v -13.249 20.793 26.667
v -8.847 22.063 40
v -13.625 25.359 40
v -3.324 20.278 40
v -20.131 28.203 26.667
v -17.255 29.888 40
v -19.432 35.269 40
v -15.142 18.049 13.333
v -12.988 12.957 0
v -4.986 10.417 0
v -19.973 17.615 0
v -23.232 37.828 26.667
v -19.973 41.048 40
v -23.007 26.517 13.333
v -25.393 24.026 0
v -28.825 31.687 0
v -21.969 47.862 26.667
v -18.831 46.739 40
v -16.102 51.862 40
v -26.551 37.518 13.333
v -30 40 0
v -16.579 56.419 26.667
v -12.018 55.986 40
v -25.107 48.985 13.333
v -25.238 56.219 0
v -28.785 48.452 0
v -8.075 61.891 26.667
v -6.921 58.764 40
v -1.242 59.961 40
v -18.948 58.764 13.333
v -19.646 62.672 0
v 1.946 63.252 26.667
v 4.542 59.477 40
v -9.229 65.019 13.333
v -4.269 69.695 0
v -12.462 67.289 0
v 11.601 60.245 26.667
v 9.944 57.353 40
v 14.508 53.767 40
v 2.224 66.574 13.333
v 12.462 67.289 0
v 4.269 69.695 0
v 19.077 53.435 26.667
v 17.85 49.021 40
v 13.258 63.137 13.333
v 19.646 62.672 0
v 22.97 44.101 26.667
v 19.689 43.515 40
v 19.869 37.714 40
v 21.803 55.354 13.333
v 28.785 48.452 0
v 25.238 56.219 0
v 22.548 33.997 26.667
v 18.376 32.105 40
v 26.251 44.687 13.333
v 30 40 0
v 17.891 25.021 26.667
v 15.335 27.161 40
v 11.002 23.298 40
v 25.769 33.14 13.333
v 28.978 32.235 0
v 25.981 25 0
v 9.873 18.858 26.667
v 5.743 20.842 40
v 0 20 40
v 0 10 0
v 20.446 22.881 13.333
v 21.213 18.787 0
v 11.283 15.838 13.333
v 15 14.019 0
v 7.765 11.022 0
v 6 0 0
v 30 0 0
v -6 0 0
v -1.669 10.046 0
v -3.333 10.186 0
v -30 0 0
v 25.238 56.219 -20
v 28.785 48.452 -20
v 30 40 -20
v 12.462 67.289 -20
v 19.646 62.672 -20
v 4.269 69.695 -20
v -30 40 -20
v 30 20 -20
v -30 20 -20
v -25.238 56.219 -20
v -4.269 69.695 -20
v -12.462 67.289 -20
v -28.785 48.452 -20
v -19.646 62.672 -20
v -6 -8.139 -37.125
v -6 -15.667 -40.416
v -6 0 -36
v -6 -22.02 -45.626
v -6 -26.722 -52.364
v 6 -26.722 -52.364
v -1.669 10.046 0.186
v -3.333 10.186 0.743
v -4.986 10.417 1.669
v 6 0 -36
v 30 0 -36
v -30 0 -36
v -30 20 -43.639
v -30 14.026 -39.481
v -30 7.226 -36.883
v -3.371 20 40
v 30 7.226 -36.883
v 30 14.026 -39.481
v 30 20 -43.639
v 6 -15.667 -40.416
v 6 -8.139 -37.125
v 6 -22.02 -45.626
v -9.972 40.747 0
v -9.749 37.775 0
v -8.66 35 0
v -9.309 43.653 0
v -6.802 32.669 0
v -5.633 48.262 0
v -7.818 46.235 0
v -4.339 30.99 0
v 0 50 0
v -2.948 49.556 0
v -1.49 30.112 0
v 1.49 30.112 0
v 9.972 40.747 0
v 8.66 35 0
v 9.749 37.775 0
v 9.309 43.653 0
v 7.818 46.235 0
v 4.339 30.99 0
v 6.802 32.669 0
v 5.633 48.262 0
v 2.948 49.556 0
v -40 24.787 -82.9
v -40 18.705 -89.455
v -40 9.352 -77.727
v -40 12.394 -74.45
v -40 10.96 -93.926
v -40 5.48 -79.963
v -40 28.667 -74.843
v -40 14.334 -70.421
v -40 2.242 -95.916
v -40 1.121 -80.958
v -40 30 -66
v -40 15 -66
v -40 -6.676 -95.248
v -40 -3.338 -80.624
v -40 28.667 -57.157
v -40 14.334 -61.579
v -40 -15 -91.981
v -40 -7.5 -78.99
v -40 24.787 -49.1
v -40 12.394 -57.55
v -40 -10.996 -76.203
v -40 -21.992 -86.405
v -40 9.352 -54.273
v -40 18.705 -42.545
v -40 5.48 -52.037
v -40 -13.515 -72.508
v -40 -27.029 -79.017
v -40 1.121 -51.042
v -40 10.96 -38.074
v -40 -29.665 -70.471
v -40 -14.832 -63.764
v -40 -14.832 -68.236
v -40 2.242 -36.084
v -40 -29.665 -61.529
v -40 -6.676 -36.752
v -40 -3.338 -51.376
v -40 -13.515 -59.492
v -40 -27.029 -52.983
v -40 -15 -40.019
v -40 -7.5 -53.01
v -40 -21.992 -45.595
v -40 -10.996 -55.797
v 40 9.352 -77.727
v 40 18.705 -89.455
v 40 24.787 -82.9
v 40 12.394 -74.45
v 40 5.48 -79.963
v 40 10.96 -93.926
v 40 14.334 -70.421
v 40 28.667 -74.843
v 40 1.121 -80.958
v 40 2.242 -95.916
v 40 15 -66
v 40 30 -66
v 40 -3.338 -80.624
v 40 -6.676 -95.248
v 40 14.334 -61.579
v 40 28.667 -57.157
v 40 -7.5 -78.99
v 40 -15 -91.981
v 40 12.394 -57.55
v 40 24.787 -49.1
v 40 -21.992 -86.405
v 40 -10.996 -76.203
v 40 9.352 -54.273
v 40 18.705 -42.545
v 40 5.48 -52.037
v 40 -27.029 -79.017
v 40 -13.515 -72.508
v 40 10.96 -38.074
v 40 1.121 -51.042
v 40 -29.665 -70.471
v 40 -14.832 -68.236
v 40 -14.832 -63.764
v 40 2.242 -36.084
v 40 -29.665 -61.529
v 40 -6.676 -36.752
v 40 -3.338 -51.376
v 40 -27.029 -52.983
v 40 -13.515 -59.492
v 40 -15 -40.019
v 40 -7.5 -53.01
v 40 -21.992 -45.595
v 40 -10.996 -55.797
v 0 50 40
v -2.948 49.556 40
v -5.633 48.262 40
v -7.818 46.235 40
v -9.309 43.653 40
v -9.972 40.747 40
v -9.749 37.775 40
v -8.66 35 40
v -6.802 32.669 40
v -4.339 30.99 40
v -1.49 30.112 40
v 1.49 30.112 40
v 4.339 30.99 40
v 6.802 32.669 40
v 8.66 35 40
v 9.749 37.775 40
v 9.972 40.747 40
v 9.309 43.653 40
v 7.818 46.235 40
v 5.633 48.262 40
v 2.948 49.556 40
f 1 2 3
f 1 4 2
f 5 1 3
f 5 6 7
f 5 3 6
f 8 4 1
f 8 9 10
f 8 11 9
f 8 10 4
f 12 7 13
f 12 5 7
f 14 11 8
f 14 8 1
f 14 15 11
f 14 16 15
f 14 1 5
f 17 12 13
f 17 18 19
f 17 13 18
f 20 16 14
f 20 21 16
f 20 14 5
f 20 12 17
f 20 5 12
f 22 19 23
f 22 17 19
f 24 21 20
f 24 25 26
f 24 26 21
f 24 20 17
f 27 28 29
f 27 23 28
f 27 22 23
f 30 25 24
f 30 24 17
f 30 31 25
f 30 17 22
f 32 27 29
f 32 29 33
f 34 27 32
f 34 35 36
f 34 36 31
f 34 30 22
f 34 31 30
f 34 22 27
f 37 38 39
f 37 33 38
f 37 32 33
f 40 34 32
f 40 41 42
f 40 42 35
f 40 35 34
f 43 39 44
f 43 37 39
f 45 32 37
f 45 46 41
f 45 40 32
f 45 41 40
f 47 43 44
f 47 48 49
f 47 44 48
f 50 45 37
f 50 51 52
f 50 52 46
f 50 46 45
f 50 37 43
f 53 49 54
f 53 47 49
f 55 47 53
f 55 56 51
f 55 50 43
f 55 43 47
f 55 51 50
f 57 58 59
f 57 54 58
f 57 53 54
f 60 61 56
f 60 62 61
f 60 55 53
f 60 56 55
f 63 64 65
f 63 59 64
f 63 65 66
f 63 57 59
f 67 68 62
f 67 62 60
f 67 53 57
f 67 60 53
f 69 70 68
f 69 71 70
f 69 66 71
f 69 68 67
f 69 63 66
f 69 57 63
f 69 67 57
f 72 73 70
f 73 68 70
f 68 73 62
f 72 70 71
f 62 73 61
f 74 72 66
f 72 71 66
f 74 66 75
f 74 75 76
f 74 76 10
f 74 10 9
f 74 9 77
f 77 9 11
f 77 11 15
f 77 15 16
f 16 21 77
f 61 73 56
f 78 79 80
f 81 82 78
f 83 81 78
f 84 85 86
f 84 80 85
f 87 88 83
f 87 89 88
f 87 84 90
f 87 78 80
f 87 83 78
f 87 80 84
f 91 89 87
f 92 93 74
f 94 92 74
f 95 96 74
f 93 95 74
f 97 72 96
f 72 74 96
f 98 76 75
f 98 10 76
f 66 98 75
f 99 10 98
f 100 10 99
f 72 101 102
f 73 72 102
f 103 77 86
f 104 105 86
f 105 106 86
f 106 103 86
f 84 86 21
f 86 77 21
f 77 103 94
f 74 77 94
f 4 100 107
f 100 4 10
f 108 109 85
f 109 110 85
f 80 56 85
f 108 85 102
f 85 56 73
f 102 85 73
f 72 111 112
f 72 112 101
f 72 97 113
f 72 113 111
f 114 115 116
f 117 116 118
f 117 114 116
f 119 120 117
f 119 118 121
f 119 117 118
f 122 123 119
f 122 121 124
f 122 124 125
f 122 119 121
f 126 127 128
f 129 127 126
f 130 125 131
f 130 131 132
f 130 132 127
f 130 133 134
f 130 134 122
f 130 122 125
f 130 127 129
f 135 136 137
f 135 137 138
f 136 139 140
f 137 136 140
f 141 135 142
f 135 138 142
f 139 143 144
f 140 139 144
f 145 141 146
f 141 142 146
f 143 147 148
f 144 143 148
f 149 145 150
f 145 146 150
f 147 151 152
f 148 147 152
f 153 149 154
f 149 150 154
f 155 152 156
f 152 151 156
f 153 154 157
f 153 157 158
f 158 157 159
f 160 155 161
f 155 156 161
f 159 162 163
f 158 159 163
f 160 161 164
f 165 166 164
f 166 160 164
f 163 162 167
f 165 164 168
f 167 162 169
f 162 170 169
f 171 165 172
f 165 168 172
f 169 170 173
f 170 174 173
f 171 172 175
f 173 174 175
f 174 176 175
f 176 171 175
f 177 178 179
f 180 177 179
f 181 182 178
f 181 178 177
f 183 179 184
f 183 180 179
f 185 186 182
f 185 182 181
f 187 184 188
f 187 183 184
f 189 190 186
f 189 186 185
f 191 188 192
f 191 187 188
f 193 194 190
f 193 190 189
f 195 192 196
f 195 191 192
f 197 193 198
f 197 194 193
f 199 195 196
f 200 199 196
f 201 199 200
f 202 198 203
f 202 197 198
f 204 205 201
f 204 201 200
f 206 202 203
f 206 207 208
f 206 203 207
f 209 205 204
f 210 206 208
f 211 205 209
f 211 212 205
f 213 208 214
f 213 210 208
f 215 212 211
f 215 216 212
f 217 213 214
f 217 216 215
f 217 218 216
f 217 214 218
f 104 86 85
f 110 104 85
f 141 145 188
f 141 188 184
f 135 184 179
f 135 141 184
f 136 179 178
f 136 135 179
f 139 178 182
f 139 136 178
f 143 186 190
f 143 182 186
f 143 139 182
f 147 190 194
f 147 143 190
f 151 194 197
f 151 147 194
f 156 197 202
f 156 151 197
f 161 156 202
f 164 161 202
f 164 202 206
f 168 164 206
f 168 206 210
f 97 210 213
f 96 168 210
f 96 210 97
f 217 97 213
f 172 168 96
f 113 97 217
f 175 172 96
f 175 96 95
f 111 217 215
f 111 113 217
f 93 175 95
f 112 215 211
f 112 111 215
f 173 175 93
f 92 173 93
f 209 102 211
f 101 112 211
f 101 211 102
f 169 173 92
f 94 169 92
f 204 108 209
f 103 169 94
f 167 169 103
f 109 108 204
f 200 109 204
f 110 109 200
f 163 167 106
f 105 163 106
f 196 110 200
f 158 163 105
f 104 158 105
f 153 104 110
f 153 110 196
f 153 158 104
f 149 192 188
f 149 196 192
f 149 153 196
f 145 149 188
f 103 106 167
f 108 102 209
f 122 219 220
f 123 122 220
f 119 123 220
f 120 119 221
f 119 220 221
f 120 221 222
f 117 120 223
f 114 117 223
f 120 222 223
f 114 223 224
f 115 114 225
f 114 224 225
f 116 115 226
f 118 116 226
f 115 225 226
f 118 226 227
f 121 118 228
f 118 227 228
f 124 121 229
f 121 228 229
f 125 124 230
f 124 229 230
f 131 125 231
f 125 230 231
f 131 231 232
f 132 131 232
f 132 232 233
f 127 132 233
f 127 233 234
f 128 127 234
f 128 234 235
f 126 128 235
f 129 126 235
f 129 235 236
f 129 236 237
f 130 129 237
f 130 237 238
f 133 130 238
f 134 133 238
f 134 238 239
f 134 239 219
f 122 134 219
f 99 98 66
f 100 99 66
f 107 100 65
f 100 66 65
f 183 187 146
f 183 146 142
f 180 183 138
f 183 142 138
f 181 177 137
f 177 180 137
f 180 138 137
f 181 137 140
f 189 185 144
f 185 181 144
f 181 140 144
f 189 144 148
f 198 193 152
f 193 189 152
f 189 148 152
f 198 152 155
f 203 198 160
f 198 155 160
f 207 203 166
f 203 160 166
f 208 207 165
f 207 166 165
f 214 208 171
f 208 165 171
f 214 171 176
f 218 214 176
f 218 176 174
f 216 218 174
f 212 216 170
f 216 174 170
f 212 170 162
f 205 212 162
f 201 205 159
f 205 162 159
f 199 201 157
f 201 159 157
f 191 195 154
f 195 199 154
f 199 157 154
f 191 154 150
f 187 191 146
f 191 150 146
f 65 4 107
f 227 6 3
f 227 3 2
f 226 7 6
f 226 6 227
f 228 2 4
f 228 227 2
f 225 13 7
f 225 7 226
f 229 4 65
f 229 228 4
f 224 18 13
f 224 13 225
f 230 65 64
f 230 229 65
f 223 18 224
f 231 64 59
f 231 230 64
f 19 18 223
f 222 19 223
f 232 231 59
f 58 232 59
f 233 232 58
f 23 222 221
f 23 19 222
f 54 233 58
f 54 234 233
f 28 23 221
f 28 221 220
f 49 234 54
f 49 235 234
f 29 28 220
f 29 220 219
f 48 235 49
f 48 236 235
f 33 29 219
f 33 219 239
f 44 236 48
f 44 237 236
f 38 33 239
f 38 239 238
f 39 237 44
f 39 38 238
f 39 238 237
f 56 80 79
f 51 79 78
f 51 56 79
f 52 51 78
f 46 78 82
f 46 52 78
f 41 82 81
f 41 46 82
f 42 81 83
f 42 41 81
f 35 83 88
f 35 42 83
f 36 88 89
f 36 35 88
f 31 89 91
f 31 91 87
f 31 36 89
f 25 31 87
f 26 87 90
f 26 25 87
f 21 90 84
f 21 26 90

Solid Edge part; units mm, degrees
sketch "Sketch1" plane through (0, 0, 0) normal (0, 0, 1) x (1, 0, 0)
  line L0 (30, 40) -> (30, 0)
  line L1 (0, 0) -> (30, 0)
  line L2 (0, 0) -> (-30, 0)
  line L3 (-30, 0) -> (-30, 40)
  line L4 (-30, 40) -> (30, 40)
extrude "Protrusion1" add sketch "Sketch1" against normal blind 20
sketch "Sketch2" plane through (0, 0, 0) normal (0, 0, 1) x (1, 0, 0)
  circle A0 centre (0, 40) radius 30
extrude "ExtrudedProtrusion_2" add sketch "Sketch2" against normal blind 20 and the other way blind 40
sketch "Sketch3" plane through (0, 0, 0) normal (0, 0, 1) x (1, 0, 0)
  line L0 (-30, 20) -> (30, 20)
  line L1 (30, 20) -> (30, 0)
  line L2 (30, 0) -> (-30, 0)
  line L3 (-30, 0) -> (-30, 20)
extrude "ExtrudedProtrusion_4" add sketch "Sketch3" against normal blind 60
sketch "Sketch4" plane through (0, 0, 0) normal (1, 0, 0) x (0, 1, 0)
  circle A0 centre (0, -66) radius 30
extrude "ExtrudedProtrusion_5" add sketch "Sketch4" along normal mid plane 80
sketch "Sketch5" plane through (0, 0, 0) normal (1, 0, 0) x (0, 1, 0)
  circle A0 centre (0, -66) radius 15
extrude "ExtrudedCutout_1" cut sketch "Sketch5" along normal mid plane 80
sketch "Sketch6" plane through (0, 0, 0) normal (1, 0, 0) x (0, 1, 0)
  line L0 (0, 0) -> (-26.7217, -52.3636)
  line L1 (0, -36) -> (0, 0)
  arc A0 (-26.7217, -52.3636) -> (0, -36) centre (0, -66) cw
extrude "ExtrudedProtrusion_6" add sketch "Sketch6" along normal mid plane 12
sketch "Sketch7" plane through (0, 40, 40) normal (0, 0, 1) x (0, 1, 0)
  circle A0 centre (0, 0) radius 10
extrude "Cutout1" cut sketch "Sketch7" against normal up to vertex (40 mm away)
sketch "Sketch8" plane through (0, 0, 0) normal (1, 0, 0) x (0, 1, 0)
  line L0 (10, 40) -> (10, 0)
  line L1 (10, 0) -> (20, 40)
  line L2 (20, 40) -> (10, 40)
revolve "RevolvedCutout_2" cut sketch "Sketch8" angle 350.433 about axis through (0, 40, 40) along (0, 0, 1)
sketch "Sketch9" plane through (0, 0, 0) normal (1, 0, 0) x (0, 1, 0)
  line L0 (20, 40) -> (10, 40)
  line L1 (10, 40) -> (10, 0)
  line L2 (10, 0) -> (20, 40)
extrude "ExtrudedCutout_3" cut sketch "Sketch9" against normal blind 14.7249
